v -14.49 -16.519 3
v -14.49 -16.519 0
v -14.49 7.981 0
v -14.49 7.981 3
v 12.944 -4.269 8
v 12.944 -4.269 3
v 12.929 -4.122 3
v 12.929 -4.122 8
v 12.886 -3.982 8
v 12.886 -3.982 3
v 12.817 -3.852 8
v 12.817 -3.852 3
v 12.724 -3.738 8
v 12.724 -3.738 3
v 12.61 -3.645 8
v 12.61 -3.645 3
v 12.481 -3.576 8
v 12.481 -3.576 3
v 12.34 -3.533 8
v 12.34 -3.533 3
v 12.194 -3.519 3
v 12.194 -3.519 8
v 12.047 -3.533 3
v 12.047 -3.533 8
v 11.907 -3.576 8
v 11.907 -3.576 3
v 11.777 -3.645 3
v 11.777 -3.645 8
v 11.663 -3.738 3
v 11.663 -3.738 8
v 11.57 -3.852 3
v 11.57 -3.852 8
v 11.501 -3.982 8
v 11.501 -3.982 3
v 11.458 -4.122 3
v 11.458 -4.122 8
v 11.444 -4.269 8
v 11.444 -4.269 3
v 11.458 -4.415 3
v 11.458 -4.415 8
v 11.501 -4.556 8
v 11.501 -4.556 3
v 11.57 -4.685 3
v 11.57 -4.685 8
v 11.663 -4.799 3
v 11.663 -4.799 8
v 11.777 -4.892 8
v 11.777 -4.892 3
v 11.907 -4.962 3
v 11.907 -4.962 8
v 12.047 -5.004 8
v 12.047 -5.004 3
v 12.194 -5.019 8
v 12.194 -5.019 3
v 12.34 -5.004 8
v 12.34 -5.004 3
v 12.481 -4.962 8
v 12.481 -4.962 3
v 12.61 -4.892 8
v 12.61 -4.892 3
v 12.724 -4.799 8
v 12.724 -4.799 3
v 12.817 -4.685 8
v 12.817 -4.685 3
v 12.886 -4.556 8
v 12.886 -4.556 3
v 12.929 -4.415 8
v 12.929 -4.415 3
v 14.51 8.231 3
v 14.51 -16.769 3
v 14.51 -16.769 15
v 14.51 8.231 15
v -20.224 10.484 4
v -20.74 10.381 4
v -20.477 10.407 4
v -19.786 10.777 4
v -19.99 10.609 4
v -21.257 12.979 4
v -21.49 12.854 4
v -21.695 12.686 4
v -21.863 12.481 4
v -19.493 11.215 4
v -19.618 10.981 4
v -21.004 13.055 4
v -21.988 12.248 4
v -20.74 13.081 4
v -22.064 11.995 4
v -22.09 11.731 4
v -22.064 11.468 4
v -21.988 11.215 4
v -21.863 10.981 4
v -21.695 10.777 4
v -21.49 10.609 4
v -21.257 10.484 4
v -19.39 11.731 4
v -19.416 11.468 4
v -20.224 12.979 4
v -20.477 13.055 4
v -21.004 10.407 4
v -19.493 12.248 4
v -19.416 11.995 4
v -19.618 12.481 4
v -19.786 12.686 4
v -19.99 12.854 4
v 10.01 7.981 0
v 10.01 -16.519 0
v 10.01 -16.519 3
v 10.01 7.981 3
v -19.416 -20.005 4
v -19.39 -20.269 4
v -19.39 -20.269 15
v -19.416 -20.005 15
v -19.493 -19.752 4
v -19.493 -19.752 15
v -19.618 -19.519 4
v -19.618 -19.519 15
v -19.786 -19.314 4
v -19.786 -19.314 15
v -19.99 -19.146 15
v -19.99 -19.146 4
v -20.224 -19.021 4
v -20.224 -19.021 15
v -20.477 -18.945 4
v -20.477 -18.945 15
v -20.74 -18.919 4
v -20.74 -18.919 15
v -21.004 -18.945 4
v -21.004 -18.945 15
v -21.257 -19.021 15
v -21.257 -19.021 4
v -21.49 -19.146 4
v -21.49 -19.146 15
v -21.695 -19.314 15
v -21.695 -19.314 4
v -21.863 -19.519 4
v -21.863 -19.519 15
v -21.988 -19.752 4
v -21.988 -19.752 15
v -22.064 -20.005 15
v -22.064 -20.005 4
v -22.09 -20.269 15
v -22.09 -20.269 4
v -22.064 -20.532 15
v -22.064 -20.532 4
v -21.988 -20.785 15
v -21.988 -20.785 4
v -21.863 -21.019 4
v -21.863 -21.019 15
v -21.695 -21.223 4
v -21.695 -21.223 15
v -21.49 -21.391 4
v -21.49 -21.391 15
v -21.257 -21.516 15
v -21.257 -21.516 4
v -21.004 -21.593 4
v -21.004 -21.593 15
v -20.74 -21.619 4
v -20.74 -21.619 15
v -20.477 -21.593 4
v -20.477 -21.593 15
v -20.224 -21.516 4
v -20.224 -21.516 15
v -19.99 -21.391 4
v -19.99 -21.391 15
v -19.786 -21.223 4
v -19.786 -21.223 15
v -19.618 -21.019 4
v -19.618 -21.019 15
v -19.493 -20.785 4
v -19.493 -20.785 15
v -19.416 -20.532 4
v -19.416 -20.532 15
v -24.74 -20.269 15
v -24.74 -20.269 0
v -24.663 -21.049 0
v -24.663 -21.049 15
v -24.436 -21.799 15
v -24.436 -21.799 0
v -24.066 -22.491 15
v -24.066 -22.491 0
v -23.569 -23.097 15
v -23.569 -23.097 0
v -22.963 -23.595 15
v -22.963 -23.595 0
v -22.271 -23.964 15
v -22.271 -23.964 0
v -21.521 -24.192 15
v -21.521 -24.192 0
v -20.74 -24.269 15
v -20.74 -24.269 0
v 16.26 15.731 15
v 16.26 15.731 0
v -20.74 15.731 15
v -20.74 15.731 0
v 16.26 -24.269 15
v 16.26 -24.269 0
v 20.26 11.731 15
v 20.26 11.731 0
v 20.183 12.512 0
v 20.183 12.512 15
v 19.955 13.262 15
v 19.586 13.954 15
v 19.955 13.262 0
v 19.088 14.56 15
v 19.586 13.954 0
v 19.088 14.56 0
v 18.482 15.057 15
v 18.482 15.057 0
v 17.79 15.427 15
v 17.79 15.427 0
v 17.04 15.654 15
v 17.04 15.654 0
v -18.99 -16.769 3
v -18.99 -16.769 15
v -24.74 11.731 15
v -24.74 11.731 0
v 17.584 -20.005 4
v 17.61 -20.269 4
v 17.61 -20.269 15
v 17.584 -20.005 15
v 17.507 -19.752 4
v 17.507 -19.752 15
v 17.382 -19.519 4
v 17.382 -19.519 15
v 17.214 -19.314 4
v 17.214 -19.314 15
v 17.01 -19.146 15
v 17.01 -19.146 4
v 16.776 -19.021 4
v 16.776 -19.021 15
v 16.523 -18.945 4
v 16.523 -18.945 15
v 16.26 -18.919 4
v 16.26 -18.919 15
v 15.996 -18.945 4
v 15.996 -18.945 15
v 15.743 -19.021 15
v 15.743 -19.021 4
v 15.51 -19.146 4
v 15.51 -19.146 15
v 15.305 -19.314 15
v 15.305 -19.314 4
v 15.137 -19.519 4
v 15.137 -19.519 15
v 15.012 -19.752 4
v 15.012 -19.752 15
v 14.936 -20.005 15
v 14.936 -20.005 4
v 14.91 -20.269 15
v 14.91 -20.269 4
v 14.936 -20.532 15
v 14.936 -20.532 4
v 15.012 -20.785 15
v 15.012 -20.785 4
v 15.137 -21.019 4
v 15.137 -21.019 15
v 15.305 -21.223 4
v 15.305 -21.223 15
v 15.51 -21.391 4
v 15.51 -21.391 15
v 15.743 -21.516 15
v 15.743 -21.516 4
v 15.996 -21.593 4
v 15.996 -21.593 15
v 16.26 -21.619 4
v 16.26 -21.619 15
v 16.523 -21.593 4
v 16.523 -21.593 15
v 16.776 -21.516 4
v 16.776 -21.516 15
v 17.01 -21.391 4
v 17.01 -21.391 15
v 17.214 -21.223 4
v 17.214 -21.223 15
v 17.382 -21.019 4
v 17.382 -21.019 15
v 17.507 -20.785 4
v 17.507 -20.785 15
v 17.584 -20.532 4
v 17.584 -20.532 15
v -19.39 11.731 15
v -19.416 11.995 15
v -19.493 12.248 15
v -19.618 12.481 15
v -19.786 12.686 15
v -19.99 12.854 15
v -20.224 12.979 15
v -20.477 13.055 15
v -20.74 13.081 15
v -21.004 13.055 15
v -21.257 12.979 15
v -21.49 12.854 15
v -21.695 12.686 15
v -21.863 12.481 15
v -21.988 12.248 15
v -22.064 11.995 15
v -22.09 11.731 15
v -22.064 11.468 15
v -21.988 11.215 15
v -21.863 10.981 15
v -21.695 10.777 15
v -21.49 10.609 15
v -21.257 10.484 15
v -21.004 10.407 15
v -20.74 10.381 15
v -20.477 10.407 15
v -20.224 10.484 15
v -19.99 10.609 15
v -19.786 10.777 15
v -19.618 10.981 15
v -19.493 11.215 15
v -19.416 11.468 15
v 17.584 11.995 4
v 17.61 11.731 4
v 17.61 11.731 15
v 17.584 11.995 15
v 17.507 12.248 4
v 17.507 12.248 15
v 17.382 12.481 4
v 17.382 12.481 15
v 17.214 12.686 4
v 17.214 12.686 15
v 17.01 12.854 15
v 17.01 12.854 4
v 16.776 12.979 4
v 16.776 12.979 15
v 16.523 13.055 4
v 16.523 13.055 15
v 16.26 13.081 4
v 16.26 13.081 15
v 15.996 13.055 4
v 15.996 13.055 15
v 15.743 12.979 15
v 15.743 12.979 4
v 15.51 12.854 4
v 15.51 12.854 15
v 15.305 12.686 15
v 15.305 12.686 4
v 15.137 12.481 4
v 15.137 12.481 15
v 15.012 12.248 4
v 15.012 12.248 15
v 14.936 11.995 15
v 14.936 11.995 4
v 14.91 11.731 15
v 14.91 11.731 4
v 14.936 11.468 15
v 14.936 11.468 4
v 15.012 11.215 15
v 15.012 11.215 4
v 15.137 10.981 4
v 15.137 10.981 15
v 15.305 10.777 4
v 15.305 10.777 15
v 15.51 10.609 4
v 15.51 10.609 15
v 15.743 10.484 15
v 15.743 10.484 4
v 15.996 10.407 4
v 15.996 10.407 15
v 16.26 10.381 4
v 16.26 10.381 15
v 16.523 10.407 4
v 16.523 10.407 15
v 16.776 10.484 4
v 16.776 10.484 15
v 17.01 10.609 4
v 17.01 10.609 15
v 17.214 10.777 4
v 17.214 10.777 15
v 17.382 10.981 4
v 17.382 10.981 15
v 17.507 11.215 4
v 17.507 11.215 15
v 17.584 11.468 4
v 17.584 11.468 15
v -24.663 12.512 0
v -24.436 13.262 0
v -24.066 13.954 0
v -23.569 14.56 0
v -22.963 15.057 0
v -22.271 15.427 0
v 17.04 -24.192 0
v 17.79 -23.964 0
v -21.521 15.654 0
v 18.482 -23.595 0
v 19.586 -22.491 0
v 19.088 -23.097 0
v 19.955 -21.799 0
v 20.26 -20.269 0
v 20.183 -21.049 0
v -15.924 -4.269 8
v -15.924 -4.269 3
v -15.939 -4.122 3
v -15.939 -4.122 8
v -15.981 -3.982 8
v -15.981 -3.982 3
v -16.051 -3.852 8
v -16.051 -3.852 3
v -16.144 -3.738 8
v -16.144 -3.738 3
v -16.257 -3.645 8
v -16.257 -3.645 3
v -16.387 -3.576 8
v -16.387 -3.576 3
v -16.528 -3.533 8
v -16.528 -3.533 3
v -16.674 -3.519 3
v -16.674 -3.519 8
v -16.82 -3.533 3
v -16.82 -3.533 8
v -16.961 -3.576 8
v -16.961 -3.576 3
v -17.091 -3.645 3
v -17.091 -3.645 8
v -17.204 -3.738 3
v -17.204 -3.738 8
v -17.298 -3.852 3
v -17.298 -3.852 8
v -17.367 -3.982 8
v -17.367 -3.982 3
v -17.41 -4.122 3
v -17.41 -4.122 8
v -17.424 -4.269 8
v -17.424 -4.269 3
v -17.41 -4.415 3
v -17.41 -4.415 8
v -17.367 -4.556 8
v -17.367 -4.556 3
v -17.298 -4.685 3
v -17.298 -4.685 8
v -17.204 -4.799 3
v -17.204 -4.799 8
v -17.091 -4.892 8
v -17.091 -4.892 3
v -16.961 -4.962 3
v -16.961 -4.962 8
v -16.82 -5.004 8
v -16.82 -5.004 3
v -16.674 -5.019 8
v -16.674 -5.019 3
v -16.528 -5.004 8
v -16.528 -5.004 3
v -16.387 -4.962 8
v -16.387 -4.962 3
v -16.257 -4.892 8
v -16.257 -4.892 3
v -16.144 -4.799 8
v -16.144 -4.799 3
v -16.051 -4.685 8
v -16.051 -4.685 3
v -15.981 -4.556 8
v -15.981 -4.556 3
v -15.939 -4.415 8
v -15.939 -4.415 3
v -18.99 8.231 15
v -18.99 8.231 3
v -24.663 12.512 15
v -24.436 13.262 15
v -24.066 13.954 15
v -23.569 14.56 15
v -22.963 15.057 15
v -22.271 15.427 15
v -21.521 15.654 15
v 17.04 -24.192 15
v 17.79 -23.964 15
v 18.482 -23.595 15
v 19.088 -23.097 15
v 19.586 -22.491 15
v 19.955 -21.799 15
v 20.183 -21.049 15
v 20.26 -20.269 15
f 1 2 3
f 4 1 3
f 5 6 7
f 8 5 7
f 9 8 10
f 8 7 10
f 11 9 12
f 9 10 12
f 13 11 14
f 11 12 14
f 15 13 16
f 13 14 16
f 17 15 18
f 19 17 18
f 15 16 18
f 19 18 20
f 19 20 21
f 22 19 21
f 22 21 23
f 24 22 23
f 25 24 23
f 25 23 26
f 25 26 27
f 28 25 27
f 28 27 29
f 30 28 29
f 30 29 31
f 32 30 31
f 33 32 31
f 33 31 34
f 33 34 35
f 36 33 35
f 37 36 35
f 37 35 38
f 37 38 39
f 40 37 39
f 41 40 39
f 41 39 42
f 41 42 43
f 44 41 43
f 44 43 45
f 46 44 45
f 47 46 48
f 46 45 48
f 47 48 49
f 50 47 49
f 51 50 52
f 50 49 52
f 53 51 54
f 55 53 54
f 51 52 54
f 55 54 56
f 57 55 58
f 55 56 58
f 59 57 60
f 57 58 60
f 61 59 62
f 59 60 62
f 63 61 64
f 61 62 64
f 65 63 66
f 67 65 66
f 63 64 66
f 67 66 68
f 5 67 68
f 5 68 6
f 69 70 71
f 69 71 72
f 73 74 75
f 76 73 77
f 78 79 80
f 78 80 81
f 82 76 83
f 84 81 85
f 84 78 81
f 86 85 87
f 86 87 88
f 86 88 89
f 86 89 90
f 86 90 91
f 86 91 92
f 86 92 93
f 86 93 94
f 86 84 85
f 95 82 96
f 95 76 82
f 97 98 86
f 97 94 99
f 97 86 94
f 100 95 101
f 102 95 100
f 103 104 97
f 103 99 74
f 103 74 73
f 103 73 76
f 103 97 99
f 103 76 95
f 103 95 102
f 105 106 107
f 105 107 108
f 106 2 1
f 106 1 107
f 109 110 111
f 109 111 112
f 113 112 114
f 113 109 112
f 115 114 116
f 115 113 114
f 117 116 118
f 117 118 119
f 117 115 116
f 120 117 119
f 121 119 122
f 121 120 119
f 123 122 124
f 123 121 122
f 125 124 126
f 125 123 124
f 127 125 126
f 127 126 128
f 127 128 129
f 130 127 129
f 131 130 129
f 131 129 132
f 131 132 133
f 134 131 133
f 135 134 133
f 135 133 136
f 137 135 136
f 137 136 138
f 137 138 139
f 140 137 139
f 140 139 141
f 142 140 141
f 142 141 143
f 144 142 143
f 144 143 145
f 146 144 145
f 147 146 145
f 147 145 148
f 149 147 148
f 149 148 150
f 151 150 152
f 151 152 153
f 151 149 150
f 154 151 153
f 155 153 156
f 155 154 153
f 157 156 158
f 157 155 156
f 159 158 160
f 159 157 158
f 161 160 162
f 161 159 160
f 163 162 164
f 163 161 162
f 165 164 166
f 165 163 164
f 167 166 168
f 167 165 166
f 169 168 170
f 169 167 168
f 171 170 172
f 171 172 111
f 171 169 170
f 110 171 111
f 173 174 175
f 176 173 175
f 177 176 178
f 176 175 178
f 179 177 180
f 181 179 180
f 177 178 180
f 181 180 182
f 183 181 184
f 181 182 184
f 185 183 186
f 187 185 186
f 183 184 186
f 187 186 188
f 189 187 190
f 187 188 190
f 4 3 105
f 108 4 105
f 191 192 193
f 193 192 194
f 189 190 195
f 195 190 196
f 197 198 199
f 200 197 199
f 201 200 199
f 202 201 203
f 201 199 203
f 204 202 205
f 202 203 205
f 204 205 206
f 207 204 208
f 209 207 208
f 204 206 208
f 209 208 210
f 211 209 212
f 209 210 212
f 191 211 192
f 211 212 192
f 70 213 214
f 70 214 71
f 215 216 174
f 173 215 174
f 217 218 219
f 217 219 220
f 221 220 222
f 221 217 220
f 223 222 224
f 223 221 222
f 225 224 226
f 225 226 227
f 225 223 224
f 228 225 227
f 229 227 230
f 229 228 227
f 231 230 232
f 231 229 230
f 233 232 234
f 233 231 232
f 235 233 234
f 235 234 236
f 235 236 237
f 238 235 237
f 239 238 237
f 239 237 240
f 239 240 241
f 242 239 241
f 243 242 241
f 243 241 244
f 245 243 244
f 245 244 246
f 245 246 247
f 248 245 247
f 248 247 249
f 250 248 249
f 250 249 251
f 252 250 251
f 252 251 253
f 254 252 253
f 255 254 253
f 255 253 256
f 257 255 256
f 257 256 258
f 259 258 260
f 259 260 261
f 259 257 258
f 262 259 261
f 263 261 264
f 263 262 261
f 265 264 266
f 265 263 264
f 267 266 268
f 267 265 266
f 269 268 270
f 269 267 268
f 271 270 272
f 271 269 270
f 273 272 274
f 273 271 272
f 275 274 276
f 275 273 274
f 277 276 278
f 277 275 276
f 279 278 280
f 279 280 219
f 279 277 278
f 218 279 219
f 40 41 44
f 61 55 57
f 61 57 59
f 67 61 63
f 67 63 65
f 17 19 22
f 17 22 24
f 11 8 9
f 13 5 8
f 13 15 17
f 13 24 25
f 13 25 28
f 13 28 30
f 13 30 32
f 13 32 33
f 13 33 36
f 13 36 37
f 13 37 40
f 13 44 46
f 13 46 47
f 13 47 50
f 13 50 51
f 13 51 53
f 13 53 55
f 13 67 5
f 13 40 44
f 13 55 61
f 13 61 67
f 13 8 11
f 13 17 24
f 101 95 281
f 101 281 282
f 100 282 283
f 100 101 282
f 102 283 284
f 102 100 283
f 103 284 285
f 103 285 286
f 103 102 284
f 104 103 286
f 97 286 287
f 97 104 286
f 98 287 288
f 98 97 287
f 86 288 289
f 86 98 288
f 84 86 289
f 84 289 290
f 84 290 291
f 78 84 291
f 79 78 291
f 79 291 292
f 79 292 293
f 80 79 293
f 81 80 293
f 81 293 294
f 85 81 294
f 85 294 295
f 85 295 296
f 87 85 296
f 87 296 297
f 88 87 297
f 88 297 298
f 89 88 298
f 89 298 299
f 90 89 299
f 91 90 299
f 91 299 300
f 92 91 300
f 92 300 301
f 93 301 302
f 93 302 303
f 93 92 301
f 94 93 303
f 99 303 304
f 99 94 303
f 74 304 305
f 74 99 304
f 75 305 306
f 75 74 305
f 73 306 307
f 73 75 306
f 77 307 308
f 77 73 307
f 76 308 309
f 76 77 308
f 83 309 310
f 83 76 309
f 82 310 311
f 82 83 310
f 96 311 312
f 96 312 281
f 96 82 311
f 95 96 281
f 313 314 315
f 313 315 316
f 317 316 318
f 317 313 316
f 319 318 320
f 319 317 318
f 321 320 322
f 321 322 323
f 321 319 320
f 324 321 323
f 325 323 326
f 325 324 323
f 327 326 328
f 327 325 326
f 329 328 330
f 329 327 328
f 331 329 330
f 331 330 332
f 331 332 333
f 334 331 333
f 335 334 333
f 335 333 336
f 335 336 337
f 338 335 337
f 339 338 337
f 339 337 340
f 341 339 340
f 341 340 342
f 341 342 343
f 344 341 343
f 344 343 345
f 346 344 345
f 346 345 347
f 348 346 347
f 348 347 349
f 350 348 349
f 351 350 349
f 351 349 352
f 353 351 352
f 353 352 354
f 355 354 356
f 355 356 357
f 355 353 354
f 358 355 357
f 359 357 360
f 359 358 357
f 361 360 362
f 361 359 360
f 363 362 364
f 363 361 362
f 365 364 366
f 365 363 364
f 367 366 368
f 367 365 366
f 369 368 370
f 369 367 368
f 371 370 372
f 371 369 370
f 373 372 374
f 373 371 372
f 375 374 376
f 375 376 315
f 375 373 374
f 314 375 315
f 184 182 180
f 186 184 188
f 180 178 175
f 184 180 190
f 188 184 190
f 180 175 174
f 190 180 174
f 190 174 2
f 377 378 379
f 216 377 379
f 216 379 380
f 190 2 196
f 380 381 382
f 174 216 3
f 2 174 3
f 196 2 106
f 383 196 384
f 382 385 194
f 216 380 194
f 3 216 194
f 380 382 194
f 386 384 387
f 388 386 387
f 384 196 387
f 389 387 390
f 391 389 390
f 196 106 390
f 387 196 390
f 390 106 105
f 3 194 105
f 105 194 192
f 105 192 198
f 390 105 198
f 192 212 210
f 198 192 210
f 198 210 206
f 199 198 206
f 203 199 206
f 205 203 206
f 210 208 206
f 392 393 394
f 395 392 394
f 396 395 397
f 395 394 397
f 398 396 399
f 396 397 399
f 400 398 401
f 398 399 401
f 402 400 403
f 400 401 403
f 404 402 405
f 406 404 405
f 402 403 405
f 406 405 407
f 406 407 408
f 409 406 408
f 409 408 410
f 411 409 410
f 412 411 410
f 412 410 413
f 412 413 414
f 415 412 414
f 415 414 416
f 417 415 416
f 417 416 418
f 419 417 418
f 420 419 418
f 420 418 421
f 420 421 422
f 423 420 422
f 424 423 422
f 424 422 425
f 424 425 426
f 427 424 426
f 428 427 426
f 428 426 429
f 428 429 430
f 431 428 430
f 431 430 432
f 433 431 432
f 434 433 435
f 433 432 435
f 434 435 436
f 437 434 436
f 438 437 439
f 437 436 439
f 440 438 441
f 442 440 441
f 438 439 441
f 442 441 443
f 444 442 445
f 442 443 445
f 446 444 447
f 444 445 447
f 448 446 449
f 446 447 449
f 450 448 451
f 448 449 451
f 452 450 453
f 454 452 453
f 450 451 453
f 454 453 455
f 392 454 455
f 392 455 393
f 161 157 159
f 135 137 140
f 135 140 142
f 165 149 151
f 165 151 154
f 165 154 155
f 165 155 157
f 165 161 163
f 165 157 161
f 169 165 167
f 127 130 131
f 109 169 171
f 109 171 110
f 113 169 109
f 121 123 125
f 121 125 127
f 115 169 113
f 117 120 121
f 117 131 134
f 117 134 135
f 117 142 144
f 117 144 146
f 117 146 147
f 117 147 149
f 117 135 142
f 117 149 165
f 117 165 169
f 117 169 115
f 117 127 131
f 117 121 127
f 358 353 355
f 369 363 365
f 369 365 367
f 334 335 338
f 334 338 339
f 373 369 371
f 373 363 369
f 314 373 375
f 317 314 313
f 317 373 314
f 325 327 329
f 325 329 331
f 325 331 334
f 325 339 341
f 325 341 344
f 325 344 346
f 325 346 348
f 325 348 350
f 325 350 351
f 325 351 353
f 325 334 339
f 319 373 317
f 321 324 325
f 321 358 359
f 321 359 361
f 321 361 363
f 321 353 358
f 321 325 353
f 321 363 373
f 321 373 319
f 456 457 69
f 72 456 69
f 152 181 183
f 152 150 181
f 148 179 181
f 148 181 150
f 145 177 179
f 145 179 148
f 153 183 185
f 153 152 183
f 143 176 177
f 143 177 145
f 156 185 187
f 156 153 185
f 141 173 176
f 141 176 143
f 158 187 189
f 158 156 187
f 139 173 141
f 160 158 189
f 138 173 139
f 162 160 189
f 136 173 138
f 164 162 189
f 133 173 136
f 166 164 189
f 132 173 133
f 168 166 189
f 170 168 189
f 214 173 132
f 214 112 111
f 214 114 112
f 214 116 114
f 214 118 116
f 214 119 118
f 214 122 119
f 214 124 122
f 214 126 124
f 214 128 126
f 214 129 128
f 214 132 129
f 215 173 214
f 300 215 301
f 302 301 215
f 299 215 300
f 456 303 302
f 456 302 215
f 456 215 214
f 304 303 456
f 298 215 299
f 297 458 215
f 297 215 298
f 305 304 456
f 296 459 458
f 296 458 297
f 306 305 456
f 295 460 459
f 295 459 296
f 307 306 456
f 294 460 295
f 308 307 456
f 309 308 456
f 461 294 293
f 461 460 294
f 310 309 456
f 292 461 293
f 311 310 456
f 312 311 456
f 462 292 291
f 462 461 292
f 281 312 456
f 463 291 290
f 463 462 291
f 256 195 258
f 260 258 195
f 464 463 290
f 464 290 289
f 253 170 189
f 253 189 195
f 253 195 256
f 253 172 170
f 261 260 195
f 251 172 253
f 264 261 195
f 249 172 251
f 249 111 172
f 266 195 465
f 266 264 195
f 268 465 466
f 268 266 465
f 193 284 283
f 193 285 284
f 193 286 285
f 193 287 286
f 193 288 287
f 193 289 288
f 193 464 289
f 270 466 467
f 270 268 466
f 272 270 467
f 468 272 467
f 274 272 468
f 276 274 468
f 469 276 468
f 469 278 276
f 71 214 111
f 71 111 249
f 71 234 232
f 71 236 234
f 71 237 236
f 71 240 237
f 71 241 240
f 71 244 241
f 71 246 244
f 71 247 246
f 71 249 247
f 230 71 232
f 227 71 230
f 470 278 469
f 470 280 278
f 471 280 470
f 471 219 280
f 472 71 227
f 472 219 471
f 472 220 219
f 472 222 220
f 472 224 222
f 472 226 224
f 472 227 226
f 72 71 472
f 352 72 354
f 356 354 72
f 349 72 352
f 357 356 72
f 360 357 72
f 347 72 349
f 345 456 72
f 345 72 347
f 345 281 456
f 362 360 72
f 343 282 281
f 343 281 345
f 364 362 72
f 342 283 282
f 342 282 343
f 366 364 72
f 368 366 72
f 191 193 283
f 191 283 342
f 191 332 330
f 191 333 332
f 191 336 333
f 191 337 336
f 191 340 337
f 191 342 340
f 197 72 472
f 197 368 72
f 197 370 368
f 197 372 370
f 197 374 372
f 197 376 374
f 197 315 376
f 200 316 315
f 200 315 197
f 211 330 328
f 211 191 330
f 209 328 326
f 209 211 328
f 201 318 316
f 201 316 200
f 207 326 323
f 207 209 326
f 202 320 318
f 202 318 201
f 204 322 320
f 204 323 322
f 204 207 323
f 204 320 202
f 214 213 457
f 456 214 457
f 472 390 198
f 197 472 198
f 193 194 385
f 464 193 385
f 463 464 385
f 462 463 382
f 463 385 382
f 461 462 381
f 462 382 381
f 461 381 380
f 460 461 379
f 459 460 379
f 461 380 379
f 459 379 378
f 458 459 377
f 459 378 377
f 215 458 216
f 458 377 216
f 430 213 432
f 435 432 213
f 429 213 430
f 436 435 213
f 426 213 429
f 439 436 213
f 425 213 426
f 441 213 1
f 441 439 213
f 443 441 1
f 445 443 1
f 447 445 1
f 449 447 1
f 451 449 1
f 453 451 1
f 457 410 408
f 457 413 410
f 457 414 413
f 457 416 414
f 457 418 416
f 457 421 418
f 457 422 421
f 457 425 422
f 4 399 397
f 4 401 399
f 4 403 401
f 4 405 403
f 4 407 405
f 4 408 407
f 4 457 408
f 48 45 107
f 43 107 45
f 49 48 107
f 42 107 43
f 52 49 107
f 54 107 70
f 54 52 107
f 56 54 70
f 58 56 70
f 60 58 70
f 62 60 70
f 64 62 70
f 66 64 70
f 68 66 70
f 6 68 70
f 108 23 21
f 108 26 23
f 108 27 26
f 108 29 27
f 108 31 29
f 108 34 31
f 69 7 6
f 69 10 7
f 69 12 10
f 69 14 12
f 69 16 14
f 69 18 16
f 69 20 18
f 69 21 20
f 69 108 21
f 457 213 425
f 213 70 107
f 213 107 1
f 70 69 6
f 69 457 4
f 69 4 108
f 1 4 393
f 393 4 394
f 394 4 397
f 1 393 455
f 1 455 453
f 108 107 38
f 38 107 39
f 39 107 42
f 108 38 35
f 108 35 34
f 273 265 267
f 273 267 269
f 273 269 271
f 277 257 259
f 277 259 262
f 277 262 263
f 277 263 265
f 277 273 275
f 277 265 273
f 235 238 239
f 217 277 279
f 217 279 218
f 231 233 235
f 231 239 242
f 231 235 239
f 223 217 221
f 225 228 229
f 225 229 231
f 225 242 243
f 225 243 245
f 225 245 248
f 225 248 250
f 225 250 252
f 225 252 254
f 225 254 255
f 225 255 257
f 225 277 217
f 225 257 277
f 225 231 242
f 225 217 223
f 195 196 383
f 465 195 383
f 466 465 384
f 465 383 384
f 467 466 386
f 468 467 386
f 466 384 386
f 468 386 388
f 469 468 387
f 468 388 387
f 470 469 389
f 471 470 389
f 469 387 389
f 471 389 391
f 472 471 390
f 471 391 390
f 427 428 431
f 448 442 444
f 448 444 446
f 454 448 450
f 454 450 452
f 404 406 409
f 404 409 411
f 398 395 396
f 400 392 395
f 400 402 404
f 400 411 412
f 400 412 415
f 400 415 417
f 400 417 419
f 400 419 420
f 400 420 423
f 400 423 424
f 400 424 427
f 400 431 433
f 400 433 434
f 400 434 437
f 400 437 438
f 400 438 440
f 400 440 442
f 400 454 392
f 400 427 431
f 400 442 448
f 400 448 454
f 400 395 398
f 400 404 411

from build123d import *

# Parameters (mm, degrees)
F0_R     = 1.35
F0_W     = 33.5
F0_H     = 25
F1_DEPTH = 15
F0_R_2   = 0.75
F0_W_2   = 24.5
F0_H_2   = 24.5
F2_DEPTH = 3
F3_DEPTH = 8
F4_DEPTH = 4


with BuildPart() as f1:
    # F0 (on Top) → F1 (new body)
    with BuildSketch(Plane.XY):
        with BuildLine():
            ThreePointArc((-20.740295, 15.731344), (-23.568722, 14.559771), (-24.740295, 11.731344))
            Line((-24.740295, 11.731344), (-24.740295, -20.268656))
            ThreePointArc((-24.740295, -20.268656), (-23.568722, -23.097083), (-20.740295, -24.268656))
            Line((-20.740295, -24.268656), (16.259705, -24.268656))
            ThreePointArc((16.259705, -24.268656), (19.088132, -23.097083), (20.259705, -20.268656))
            Line((20.259705, -20.268656), (20.259705, 11.731344))
            ThreePointArc((20.259705, 11.731344), (19.088132, 14.559771), (16.259705, 15.731344))
            Line((16.259705, 15.731344), (-20.740295, 15.731344))
        make_face()
        with Locations((-20.740295, -20.268656)):
            Circle(F0_R, mode=Mode.SUBTRACT)
        with Locations((16.259705, -20.268656)):
            Circle(F0_R, mode=Mode.SUBTRACT)
        with Locations((-20.740295, 11.731344)):
            Circle(F0_R, mode=Mode.SUBTRACT)
        with Locations((-2.240295, -4.268656)):
            Rectangle(F0_W, F0_H, mode=Mode.SUBTRACT)
        with Locations((16.259705, 11.731344)):
            Circle(F0_R, mode=Mode.SUBTRACT)
    extrude(amount=F1_DEPTH)

    # F0 (on Top) → F2 (join)
    with BuildSketch(Plane.XY):
        with Locations((-2.240295, -4.268656)):
            Rectangle(F0_W, F0_H)
        with Locations((-16.674155, -4.268656)):
            Circle(F0_R_2, mode=Mode.SUBTRACT)
        with Locations((-2.240295, -4.268656)):
            Rectangle(F0_W_2, F0_H_2, mode=Mode.SUBTRACT)
        with Locations((12.193565, -4.268656)):
            Circle(F0_R_2, mode=Mode.SUBTRACT)
    extrude(amount=F2_DEPTH)

    # F0 (on Top) → F3 (join)
    with BuildSketch(Plane.XY):
        with Locations((-16.674155, -4.268656)):
            Circle(F0_R_2)
        with Locations((12.193565, -4.268656)):
            Circle(F0_R_2)
    extrude(amount=F3_DEPTH)

    # F0 (on Top) → F4 (join)
    with BuildSketch(Plane.XY):
        with Locations((-20.740295, 11.731344)):
            Circle(F0_R)
        with Locations((16.259705, 11.731344)):
            Circle(F0_R)
        with Locations((16.259705, -20.268656)):
            Circle(F0_R)
        with Locations((-20.740295, -20.268656)):
            Circle(F0_R)
    extrude(amount=F4_DEPTH)


solid = f1.part
